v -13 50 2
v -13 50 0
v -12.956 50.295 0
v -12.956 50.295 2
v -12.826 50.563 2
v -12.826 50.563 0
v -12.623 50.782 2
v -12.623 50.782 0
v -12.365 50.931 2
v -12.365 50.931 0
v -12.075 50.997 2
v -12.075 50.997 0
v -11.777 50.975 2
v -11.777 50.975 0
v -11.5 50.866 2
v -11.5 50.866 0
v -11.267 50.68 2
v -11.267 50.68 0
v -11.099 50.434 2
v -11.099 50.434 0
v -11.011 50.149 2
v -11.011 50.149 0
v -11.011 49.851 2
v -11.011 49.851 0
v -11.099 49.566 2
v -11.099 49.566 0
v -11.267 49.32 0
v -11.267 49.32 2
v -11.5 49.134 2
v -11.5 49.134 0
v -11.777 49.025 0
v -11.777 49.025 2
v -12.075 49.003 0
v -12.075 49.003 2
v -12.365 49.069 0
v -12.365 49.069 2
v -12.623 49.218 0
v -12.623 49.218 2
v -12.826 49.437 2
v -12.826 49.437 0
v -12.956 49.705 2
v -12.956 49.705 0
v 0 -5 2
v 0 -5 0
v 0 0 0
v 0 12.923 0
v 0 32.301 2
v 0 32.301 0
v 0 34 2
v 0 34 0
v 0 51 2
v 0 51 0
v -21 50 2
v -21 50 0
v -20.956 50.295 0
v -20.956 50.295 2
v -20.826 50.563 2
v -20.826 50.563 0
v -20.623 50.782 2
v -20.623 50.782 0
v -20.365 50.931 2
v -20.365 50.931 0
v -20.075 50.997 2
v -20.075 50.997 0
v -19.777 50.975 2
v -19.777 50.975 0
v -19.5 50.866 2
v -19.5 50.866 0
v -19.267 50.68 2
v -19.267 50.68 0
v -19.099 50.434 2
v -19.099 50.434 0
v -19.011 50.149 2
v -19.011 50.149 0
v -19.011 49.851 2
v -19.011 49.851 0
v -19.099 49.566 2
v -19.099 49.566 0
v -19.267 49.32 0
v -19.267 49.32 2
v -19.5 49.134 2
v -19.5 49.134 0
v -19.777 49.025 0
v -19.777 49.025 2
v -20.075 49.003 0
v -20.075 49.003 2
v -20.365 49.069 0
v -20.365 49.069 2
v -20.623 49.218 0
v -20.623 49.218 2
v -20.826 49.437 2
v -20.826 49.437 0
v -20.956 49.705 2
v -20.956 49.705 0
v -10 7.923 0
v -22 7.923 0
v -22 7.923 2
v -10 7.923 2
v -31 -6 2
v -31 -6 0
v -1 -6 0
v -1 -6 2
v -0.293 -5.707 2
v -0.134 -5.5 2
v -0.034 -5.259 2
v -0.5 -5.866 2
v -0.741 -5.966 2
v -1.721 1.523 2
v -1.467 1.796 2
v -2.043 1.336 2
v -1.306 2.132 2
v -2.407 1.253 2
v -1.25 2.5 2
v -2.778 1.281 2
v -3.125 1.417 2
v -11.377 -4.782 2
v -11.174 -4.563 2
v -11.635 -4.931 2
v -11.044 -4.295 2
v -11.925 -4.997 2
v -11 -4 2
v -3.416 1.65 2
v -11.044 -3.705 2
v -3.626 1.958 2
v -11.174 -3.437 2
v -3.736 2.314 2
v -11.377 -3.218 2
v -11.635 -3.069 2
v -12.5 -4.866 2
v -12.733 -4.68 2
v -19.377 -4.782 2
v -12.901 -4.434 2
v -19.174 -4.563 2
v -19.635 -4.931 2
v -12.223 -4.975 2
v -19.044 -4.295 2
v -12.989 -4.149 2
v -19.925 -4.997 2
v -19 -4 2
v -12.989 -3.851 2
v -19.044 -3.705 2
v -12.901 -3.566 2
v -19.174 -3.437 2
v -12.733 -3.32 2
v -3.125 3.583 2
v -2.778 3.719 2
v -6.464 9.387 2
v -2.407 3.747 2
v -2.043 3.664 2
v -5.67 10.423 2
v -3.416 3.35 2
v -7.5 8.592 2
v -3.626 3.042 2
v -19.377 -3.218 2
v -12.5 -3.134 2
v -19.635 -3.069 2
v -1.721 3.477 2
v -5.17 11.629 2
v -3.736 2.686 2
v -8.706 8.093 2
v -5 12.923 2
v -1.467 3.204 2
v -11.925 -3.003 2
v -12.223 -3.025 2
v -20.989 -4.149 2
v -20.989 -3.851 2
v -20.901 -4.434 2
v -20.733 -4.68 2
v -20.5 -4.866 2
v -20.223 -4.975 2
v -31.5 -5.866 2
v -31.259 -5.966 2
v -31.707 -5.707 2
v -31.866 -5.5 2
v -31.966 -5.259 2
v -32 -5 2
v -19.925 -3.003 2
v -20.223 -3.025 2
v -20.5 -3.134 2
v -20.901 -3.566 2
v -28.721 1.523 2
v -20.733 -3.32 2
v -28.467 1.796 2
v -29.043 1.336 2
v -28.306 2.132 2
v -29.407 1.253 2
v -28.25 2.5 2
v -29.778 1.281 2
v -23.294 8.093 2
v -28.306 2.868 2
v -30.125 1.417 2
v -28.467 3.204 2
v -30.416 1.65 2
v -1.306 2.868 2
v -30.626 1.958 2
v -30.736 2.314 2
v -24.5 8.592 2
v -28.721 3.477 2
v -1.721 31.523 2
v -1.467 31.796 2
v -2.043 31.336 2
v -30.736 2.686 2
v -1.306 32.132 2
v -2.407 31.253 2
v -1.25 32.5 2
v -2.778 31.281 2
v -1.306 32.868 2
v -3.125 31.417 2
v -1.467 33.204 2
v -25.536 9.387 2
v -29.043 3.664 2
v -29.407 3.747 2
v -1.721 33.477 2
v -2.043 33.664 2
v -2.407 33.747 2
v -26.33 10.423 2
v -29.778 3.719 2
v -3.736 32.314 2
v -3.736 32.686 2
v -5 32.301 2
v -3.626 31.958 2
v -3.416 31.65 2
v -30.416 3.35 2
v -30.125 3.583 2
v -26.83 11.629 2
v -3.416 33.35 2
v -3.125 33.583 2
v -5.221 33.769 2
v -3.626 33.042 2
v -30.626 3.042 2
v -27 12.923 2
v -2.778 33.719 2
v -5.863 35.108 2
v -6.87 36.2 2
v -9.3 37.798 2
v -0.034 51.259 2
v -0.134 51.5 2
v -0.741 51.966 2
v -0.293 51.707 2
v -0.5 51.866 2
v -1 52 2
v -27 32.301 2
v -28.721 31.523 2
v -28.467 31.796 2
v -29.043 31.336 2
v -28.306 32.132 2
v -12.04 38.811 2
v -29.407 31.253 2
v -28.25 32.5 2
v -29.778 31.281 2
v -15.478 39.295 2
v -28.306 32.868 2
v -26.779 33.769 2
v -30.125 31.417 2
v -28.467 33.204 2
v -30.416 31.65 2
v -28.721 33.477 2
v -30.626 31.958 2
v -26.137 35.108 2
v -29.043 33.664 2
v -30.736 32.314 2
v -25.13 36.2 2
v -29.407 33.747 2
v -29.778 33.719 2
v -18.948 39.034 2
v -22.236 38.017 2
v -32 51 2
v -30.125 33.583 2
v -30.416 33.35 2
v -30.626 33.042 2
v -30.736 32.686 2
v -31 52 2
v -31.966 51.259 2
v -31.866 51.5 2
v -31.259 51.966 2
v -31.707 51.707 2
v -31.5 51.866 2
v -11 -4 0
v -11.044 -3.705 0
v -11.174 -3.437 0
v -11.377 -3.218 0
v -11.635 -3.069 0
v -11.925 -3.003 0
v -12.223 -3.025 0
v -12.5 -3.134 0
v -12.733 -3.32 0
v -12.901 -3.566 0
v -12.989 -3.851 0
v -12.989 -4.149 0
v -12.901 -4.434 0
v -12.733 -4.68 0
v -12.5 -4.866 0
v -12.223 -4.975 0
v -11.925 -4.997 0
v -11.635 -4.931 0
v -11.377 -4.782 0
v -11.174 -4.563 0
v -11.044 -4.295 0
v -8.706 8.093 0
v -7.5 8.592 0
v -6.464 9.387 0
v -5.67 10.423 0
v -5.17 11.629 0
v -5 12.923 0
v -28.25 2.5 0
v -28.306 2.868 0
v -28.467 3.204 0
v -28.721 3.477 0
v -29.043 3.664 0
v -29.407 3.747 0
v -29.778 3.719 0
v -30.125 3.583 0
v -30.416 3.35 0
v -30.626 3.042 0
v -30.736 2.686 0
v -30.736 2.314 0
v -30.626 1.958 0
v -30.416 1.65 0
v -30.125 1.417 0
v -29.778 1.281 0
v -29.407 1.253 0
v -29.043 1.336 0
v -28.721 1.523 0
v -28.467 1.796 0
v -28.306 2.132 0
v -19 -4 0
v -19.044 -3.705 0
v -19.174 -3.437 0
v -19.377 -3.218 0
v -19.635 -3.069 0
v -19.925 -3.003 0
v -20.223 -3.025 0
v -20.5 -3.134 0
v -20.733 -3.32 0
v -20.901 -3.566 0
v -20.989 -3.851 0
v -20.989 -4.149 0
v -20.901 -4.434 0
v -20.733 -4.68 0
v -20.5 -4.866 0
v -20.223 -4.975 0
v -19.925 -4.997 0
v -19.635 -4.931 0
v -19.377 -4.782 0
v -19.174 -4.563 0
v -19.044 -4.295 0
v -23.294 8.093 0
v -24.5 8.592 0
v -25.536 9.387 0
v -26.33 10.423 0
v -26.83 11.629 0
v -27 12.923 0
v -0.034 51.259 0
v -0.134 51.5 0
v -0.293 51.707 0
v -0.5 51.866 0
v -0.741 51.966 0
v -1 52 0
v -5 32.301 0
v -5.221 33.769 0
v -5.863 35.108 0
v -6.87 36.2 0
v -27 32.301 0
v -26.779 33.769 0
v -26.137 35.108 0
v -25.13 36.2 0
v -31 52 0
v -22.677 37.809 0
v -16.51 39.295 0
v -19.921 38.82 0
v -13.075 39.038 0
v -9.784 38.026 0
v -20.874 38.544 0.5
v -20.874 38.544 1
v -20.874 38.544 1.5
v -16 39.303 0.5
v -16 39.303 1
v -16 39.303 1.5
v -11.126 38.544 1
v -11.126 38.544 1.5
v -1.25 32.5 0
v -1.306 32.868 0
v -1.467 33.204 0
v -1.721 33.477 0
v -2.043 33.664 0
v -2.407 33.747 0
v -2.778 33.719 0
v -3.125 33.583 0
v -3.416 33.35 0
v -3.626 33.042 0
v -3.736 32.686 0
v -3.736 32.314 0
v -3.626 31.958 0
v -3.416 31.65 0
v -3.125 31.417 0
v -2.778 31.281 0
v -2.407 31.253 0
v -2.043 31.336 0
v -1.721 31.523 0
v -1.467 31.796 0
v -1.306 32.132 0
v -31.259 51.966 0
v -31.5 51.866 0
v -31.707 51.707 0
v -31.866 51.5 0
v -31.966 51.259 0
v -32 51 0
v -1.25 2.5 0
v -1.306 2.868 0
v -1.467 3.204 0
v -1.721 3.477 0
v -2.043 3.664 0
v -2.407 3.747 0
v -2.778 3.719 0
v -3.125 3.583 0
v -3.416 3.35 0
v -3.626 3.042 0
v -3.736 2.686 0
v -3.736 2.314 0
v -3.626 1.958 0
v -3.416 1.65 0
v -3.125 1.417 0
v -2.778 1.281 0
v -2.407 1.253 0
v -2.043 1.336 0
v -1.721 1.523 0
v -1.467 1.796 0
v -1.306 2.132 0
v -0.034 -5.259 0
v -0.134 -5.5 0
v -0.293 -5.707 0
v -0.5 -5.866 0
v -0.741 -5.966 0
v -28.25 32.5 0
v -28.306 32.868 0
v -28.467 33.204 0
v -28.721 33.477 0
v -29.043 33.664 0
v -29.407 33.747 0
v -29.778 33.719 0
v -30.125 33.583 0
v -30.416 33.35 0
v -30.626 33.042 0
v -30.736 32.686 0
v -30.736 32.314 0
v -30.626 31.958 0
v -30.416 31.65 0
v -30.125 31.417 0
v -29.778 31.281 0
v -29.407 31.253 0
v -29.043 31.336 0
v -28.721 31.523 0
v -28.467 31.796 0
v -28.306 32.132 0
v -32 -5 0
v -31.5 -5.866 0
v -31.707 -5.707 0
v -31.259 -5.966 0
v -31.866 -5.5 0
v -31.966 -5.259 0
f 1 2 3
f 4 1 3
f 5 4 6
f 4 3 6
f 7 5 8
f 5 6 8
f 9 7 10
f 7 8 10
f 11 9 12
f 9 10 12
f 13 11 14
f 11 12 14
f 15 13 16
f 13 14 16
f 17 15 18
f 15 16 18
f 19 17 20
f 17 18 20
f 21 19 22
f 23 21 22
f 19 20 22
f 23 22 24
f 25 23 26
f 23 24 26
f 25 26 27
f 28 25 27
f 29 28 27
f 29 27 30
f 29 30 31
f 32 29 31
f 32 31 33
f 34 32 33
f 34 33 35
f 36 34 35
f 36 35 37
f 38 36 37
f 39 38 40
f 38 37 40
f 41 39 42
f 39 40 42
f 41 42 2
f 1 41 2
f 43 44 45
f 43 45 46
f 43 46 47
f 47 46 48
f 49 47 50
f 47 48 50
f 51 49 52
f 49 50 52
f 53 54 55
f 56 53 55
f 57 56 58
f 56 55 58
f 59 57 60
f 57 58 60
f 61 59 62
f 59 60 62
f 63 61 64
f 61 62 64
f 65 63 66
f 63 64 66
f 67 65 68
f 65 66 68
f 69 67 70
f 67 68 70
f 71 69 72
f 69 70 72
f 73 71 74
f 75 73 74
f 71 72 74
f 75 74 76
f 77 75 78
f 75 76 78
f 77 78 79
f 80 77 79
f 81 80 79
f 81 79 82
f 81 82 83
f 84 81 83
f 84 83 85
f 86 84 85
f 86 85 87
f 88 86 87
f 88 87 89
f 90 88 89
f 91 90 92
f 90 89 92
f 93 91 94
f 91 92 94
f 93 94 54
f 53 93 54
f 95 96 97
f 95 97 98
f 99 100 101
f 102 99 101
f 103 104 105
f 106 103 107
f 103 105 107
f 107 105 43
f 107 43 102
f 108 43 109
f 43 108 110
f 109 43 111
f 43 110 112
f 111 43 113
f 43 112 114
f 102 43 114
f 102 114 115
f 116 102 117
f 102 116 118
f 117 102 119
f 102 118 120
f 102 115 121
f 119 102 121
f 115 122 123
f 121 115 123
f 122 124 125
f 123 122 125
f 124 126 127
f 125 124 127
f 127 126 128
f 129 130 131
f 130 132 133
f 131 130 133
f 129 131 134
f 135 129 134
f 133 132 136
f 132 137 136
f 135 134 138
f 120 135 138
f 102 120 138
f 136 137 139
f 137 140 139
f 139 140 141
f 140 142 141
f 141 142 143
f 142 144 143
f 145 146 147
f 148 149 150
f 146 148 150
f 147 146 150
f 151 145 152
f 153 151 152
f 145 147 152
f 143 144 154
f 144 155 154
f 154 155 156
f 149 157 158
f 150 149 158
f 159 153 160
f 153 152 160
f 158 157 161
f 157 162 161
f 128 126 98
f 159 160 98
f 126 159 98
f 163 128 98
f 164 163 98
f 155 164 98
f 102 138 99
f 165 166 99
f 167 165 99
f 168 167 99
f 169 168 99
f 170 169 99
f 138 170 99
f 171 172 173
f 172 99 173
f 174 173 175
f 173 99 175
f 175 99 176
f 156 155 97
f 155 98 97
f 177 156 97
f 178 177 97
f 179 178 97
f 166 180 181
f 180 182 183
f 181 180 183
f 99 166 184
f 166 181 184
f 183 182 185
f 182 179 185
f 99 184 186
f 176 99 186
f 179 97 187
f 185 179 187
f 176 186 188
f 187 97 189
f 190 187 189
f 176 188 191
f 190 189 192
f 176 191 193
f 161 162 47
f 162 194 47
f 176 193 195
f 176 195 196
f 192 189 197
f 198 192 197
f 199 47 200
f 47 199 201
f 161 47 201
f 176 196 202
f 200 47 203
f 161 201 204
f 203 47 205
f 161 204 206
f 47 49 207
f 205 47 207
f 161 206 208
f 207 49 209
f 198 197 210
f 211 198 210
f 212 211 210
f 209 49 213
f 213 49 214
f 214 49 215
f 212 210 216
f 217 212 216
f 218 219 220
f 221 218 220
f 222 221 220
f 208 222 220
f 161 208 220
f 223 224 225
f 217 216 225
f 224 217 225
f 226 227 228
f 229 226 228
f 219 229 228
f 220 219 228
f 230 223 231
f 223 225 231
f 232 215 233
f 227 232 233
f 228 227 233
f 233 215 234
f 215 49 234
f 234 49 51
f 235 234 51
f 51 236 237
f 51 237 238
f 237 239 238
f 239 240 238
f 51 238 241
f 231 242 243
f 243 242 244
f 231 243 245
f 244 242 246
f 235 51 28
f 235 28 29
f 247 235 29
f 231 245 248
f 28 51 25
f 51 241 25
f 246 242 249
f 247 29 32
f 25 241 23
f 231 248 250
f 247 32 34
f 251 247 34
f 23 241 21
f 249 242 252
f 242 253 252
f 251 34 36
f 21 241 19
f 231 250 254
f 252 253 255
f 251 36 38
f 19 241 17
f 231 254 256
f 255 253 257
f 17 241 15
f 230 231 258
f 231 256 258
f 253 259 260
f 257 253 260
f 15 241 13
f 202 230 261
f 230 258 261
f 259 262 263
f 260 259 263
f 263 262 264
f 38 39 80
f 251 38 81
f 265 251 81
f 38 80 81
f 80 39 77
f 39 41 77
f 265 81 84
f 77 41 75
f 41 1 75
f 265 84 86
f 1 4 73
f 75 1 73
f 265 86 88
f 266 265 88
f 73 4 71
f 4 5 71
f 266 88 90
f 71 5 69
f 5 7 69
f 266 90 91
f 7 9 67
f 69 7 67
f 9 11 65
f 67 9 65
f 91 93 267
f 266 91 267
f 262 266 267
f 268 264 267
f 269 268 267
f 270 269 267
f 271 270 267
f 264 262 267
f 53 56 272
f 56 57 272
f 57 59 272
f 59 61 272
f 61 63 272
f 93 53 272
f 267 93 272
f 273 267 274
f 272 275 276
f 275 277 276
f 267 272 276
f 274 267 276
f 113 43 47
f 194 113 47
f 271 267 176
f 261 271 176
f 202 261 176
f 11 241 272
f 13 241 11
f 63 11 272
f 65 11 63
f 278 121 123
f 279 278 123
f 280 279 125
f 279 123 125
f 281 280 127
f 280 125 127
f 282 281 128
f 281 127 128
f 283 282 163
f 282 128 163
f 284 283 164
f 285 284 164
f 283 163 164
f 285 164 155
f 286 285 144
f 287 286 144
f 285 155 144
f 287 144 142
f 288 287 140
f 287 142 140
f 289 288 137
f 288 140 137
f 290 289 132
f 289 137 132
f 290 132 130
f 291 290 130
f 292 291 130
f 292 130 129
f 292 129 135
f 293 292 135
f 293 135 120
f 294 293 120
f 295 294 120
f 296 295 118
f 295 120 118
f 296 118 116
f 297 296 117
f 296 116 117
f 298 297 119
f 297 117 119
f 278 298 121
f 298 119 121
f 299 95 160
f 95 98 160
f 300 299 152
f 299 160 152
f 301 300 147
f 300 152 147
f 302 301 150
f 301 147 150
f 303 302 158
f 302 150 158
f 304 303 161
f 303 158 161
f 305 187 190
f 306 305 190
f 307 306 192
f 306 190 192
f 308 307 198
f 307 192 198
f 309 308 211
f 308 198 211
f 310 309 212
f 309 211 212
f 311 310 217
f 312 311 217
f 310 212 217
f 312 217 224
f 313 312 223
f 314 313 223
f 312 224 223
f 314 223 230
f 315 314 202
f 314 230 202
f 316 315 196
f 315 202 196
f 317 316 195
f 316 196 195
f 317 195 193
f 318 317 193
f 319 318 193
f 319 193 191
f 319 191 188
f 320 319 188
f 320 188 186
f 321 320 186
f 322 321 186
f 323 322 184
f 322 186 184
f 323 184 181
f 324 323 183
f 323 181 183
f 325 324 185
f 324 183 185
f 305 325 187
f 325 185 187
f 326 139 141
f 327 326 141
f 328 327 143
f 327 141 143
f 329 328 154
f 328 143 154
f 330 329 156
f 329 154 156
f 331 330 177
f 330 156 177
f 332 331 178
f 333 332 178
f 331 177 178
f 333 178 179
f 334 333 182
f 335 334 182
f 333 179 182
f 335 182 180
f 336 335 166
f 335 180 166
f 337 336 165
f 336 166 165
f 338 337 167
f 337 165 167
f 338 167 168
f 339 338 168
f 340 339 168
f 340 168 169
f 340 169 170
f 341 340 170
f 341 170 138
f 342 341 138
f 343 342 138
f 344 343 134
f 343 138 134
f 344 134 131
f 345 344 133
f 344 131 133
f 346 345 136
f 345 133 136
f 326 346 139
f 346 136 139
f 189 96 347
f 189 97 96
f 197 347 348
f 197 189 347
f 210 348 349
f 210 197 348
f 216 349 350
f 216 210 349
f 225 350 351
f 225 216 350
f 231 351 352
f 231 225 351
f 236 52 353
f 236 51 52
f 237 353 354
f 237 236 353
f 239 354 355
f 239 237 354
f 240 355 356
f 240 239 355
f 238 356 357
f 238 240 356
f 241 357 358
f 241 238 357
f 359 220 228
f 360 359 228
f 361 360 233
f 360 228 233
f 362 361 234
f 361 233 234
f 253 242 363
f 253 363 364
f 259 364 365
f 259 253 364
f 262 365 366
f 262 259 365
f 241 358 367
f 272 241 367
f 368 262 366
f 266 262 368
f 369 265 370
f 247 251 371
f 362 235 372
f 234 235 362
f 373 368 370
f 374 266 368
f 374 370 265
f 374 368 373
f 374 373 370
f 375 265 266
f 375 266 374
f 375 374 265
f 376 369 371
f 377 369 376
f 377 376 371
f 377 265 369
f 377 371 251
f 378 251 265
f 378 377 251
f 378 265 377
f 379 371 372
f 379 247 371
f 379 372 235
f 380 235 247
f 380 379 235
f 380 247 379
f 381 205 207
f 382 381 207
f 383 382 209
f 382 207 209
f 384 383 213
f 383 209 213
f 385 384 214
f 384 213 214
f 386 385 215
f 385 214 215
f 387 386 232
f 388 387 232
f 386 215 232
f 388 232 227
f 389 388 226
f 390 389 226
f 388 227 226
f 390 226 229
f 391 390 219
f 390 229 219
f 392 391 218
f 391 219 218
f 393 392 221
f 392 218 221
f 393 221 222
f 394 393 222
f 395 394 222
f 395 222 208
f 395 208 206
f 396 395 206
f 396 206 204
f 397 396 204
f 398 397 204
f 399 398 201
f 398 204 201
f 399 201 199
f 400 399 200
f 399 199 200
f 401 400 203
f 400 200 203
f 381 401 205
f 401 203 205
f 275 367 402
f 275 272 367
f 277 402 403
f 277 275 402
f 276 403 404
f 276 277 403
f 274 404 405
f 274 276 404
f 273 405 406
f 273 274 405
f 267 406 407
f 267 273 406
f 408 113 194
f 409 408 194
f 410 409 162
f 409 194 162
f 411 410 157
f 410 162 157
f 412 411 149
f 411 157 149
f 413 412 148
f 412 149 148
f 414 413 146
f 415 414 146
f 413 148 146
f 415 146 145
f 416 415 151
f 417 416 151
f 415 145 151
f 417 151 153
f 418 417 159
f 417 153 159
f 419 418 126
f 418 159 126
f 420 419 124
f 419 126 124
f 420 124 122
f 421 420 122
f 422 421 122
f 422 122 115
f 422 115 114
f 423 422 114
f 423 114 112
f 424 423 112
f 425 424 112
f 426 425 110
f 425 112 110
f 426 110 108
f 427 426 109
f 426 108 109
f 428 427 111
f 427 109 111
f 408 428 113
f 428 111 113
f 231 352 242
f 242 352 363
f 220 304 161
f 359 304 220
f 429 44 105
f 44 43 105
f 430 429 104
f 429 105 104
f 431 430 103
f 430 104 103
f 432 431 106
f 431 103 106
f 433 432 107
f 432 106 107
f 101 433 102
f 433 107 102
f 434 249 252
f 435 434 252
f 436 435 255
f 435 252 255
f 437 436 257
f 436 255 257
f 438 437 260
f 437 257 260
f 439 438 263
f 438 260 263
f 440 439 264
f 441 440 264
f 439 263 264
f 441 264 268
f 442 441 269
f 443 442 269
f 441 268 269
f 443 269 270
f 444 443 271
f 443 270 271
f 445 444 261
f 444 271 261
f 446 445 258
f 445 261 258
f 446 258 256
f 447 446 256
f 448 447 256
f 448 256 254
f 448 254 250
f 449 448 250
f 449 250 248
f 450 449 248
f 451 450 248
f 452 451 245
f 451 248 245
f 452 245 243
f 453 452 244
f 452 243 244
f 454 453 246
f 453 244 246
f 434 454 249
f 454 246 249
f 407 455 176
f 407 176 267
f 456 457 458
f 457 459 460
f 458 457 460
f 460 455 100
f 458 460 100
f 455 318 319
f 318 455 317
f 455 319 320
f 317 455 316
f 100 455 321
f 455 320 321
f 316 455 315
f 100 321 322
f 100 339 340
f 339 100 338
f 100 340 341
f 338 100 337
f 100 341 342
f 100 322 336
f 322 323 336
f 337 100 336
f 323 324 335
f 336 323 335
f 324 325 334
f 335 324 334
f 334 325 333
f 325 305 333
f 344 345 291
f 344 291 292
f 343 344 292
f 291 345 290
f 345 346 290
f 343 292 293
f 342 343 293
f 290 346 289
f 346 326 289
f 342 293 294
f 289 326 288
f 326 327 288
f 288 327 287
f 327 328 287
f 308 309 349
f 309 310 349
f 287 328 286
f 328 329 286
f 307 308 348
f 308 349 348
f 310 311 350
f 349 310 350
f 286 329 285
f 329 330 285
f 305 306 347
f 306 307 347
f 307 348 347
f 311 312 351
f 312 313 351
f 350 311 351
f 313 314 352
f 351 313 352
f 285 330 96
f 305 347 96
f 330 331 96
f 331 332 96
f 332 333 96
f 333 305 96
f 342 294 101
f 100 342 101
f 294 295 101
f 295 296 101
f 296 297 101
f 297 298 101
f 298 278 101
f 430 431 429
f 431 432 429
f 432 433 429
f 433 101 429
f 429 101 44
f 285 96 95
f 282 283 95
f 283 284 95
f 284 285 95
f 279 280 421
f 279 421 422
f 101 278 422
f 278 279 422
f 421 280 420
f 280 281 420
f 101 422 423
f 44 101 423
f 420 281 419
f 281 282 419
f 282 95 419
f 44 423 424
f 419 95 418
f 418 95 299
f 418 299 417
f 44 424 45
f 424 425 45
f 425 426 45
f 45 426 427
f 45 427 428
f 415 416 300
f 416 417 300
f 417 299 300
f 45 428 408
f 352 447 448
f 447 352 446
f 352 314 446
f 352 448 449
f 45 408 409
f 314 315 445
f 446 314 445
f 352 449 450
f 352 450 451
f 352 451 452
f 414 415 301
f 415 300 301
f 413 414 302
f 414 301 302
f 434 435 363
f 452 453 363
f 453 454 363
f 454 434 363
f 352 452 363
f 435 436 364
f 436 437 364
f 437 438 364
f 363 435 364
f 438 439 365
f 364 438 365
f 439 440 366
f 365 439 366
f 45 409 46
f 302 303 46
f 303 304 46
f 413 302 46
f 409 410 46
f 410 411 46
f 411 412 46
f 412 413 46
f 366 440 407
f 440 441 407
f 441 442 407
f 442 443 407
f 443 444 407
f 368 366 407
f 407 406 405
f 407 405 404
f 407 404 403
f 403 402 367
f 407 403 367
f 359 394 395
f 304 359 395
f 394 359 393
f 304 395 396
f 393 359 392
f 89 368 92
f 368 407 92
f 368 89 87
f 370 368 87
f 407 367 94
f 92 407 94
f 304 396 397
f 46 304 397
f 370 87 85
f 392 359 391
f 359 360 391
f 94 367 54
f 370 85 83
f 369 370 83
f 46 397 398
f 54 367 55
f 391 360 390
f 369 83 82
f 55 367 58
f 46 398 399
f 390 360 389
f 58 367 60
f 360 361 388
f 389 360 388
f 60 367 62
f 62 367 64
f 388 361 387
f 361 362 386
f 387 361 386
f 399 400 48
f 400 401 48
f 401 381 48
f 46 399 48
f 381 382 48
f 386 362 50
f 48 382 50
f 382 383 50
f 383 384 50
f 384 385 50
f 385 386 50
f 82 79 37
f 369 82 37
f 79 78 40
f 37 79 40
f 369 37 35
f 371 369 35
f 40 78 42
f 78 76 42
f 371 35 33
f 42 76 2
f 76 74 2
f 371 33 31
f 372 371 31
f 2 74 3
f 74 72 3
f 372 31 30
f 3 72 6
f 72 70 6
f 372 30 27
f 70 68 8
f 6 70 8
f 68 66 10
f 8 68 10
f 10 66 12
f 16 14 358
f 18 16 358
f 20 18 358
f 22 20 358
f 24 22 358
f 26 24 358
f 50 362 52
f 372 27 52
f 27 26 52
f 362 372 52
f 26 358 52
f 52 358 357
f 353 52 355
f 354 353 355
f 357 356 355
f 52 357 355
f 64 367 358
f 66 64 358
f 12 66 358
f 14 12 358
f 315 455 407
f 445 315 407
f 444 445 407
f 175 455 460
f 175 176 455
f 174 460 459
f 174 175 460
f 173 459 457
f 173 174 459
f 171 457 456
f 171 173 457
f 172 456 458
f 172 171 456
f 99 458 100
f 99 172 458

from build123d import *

# Parameters (mm, degrees)
EXTRUDE_1_OUTLINE_W  = 22
EXTRUDE_1_OUTLINE_H  = 29.37803775
EXTRUDE_1_DEPTH      = 2
FILLET_2_R           = 5
FILLET_3_R           = 5
FILLET_4_R           = 5
FILLET_5_DEPTH       = 2
FILLET_6_R           = 5
FILLET_7_R           = 5
SKETCH_4_R           = 1.25
CUT_EXTRUDE_1_DEPTH  = 2
SKETCH_5_R           = 1
CUT_EXTRUDE_3_DEPTH  = 10
CUT_EXTRUDE_4_DEPTH  = 10
EXTRUDE_3_DEPTH      = 2
SKETCH_8_R           = 1
CUT_EXTRUDE_5_DEPTH  = 2
SKETCH_9_W           = 4.328082866
SKETCH_9_H           = 16.646472559
EXTRUDE_5_DEPTH      = 2
SKETCH_11_R          = 1
CUT_EXTRUDE_6_DEPTH  = 2
SKETCH_14_W          = 35.331907889
SKETCH_14_H          = 71.069334822
CUT_EXTRUDE_7_DEPTH  = 10
SKETCH_15_W          = 33.93252641
SKETCH_15_H          = 4.378984323
EXTRUDE_6_DEPTH      = 2
SKETCH_16_W          = 33.760249026
SKETCH_16_H          = 7.770173485
CUT_EXTRUDE_9_DEPTH  = 2
CUT_EXTRUDE_10_DEPTH = 2
FILLET_8_R           = 5
EXTRUDE_START        = -2
EXTRUDE_7_DEPTH      = 2
EXTRUDE_8_DEPTH      = 2
SKETCH_20_W          = 32.150509504
SKETCH_20_H          = 6.514442596
CUT_EXTRUDE_11_DEPTH = 2
FILLET_9_R           = 5
SKETCH_23_R          = 1.25
CUT_EXTRUDE_12_DEPTH = 2
SKETCH_24_R          = 1.25
CUT_EXTRUDE_13_DEPTH = 10
CUT_EXTRUDE_14_DEPTH = 10
CUT_EXTRUDE_START    = -10
CUT_EXTRUDE_15_DEPTH = 10
SKETCH_28_R          = 1
EXTRUDE_10_DEPTH     = 2
SKETCH_29_W          = 32
SKETCH_29_H          = 4
SKETCH_29_R          = 1
EXTRUDE_11_DEPTH     = 2
SKETCH_31_R          = 1
CUT_EXTRUDE_17_DEPTH = 2
SKETCH_32_R          = 1
EXTRUDE_15_DEPTH     = 2
SKETCH_33_R          = 1
CUT_EXTRUDE_18_DEPTH = 2
SKETCH_35_R          = 1
EXTRUDE_16_DEPTH     = 2
SKETCH_36_W          = 32
SKETCH_36_H          = 2
EXTRUDE_17_DEPTH     = 2
SKETCH_37_R          = 1
EXTRUDE_19_DEPTH     = 2
SKETCH_38_R          = 1
CUT_EXTRUDE_21_DEPTH = 2
SKETCH_39_R          = 1
SKETCH_39_W          = 32
SKETCH_39_H          = 2
EXTRUDE_21_DEPTH     = 2
SKETCH_41_R          = 1
CUT_EXTRUDE_22_DEPTH = 2
FILLET_10_R          = 1


with BuildPart() as part:
    # 填料-伸長1: read off the stored shape, not the designer's step
    # 填料-伸長1 outline → 填料-伸長1 (new body)
    with BuildSketch(Plane.XY):
        with BuildLine():
            add(Edge.make_bspline(
                [(-32, 0), (-17.903811151, 0), (-12.226895644, -2.15390634), (-4.846905484, -2.579675003), (1.255778686, -1.586214789), (6.648848418, -2.437752115), (10.054997723, -2.228718788), (26.130584508, 3.269137633), (32.041733308, 41.295248118), (28.788818897, 71.787918144), (16.157681893, 46.951412799), (8.635768846, 50.925253654), (9.345383285, 39.571422639), (-5.414597035, 46), (-17.761888263, 46), (-32, 46)],
                knots=[0, 0, 0, 0, 0, 0, 0, 0, 0, 1, 1, 1, 1, 1, 1, 1, 1.916713019, 1.916713019, 1.916713019, 1.916713019, 1.916713019, 1.916713019, 1.916713019, 1.916713019, 1.916713019], degree=8))
            Line((-32, 46), (-37.468647548, 46))
            Line((-37.468647548, 46), (-37.468647548, 37.300656436))
            Line((-37.468647548, 37.300656436), (-32, 37.300656436))
            Line((-32, 37.300656436), (-32, 7.922618686))
            Line((-32, 7.922618686), (-37.468647548, 7.922618686))
            Line((-37.468647548, 7.922618686), (-37.468647548, 0))
            Line((-37.468647548, 0), (-32, 0))
        make_face()
        with Locations((-16, 22.611637561)):
            Rectangle(EXTRUDE_1_OUTLINE_W, EXTRUDE_1_OUTLINE_H, mode=Mode.SUBTRACT)
        Polygon((0, 37.300656436), (18.937237107, 37.300656436), (18.937237107, 17.573375048), (6.731868766, 7.922618686), (0, 7.922618686), align=None, mode=Mode.SUBTRACT)
    extrude(amount=EXTRUDE_1_DEPTH)

    # 圓角2
    fillet_2_edges = [part.edges().sort_by_distance(p)[0] for p in [
        (18.937237107, 37.300656436, 1),
    ]]
    fillet(fillet_2_edges, radius=FILLET_2_R)

    # 圓角3
    fillet_3_edges = [part.edges().sort_by_distance(p)[0] for p in [
        (18.937237107, 17.573375048, 1),
    ]]
    fillet(fillet_3_edges, radius=FILLET_3_R)

    # 圓角4
    fillet_4_edges = [part.edges().sort_by_distance(p)[0] for p in [
        (6.731868766, 7.922618686, 1),
    ]]
    fillet(fillet_4_edges, radius=FILLET_4_R)

    # 圓角5: read off the stored shape, not the designer's step
    # 圓角5 outline → 圓角5 (add)
    with BuildSketch(Plane.XY):
        with BuildLine():
            Line((0, 7.922618686), (4.993945193, 7.922618686))
            ThreePointArc((4.993945193, 7.922618686), (1.462326044, 9.38922246), (0, 12.92261502))
            Line((0, 12.92261502), (0, 7.922618686))
        make_face()
    extrude(amount=FILLET_5_DEPTH)

    # 圓角6
    fillet_6_edges = [part.edges().sort_by_distance(p)[0] for p in [
        (0, 37.300656436, 1),
        (-5, 7.922618686, 1),
        (-5, 37.300656436, 1),
        (-27, 37.300656436, 1),
        (-27, 7.922618686, 1),
    ]]
    fillet(fillet_6_edges, radius=FILLET_6_R)

    # 圓角7
    fillet_7_edges = [part.edges().sort_by_distance(p)[0] for p in [
        (-32, 7.922618686, 1),
        (-32, 37.300656436, 1),
    ]]
    fillet(fillet_7_edges, radius=FILLET_7_R)

    # 草圖4 → 除料-伸長1 (cut)
    with BuildSketch(Plane.XY.offset(2)):
        with Locations((-2.5, 32.5)):
            Circle(SKETCH_4_R)
        with Locations((-2.5, 2.5)):
            Circle(SKETCH_4_R)
        with Locations((-29.5, 2.5)):
            Circle(SKETCH_4_R)
        with Locations((-29.5, 32.5)):
            Circle(SKETCH_4_R)
    extrude(amount=-CUT_EXTRUDE_1_DEPTH, mode=Mode.SUBTRACT)

    # 草圖5 → 除料-伸長3 (cut)
    with BuildSketch(Plane.XY.offset(2)):
        with Locations((15.768736936, 44.547982454)):
            Circle(SKETCH_5_R)
        with Locations((21.425591185, 38.891128205)):
            Circle(SKETCH_5_R)
        with Locations((18.503337652, 13.912131705)):
            Circle(SKETCH_5_R)
        with Locations((12.846483402, 8.255277455)):
            Circle(SKETCH_5_R)
    extrude(amount=-CUT_EXTRUDE_3_DEPTH, mode=Mode.SUBTRACT)

    # 草圖6 → 除料-伸長4 (cut)
    with BuildSketch(Plane.XY.offset(2)):
        with BuildLine():
            Line((-25.535533906, 35.836190342), (-6.464466094, 35.836190342))
            add(Edge.make_bspline(
                [(-25.535533906, 35.836190342), (-21.735533906, 39.414802563), (-16, 40.309589175), (-10.264466094, 39.414802563), (-6.464466094, 35.836190342)],
                knots=[0, 0, 0, 0, 0, 1, 1, 1, 1, 1], degree=4))
        make_face()
    extrude(amount=-CUT_EXTRUDE_4_DEPTH, mode=Mode.SUBTRACT)

    # 草圖7 → 填料-伸長3 (add)
    with BuildSketch(Plane.XY.offset(2)):
        with BuildLine():
            Line((-32.468647548, 37.300656436), (-38.802161961, 37.300656436))
            ThreePointArc((-38.802161961, 37.300656436), (-42.337695867, 35.836190342), (-43.802161961, 32.300656436))
            Line((-43.802161961, 32.300656436), (-43.802161961, 12.922618686))
            ThreePointArc((-43.802161961, 12.922618686), (-42.337695867, 9.38708478), (-38.802161961, 7.922618686))
            Line((-38.802161961, 7.922618686), (-32.468647548, 7.922618686))
            Line((-32.468647548, 7.922618686), (-32.468647548, 0))
            Line((-32.468647548, 0), (-38.802161961, 0))
            Line((-38.802161961, 0), (-43.802161961, 0))
            Line((-43.802161961, 0), (-49.941860706, 0))
            Line((-49.941860706, 0), (-49.941860706, 46))
            Line((-49.941860706, 46), (-45.941860706, 46))
            Line((-45.941860706, 46), (-38.802161961, 46))
            Line((-38.802161961, 46), (-32.468647548, 46))
            Line((-32.468647548, 46), (-32.468647548, 37.300656436))
        make_face()
    extrude(amount=-EXTRUDE_3_DEPTH)

    # 草圖8 → 除料-伸長5 (cut)
    with BuildSketch(Plane.XY.offset(2)):
        with Locations((-46.872011333, 27)):
            Circle(SKETCH_8_R)
        with Locations((-46.872011333, 19)):
            Circle(SKETCH_8_R)
    extrude(amount=-CUT_EXTRUDE_5_DEPTH, mode=Mode.SUBTRACT)

    # 草圖9 → 填料-伸長5 (add)
    with BuildSketch(Plane.XY.offset(2)):
        with Locations((-46.861716305, 22.916170807)):
            Rectangle(SKETCH_9_W, SKETCH_9_H)
    extrude(amount=-EXTRUDE_5_DEPTH)

    # 草圖11 → 除料-伸長6 (cut)
    with BuildSketch(Plane.XY.offset(2)):
        with Locations((-47.941860706, 27)):
            Circle(SKETCH_11_R)
        with Locations((-47.941860706, 19)):
            Circle(SKETCH_11_R)
    extrude(amount=-CUT_EXTRUDE_6_DEPTH, mode=Mode.SUBTRACT)

    # 草圖14 → 除料-伸長7 (cut)
    with BuildSketch(Plane(origin=(0, 0, 0), x_dir=(-1, 0, 0), z_dir=(0, 0, -1))):
        with Locations((-17.665953945, 27.656712391)):
            Rectangle(SKETCH_14_W, SKETCH_14_H)
    extrude(amount=-CUT_EXTRUDE_7_DEPTH, mode=Mode.SUBTRACT)

    # 草圖15 → 填料-伸長6 (add)
    with BuildSketch(Plane(origin=(0, 0, 0), x_dir=(-1, 0, 0), z_dir=(0, 0, -1))):
        with Locations((16.966263205, 43.810507839)):
            Rectangle(SKETCH_15_W, SKETCH_15_H)
    extrude(amount=-EXTRUDE_6_DEPTH)

    # 草圖16 → 除料-伸長9 (cut)
    with BuildSketch(Plane(origin=(0, 0, 0), x_dir=(-1, 0, 0), z_dir=(0, 0, -1))):
        with Locations((16.880124513, -3.885086743)):
            Rectangle(SKETCH_16_W, SKETCH_16_H)
    extrude(amount=-CUT_EXTRUDE_9_DEPTH, mode=Mode.SUBTRACT)

    # 草圖17 → 除料-伸長10 (cut)
    with BuildSketch(Plane.XY.offset(2)):
        with BuildLine():
            Line((-5.416994756, 46), (0, 46))
            Line((0, 46), (0, 34))
            ThreePointArc((0, 34), (-1.416994756, 40.583005244), (-5.416994756, 46))
        make_face()
    extrude(amount=-CUT_EXTRUDE_10_DEPTH, mode=Mode.SUBTRACT)

    # 圓角8
    fillet_8_edges = [part.edges().sort_by_distance(p)[0] for p in [
        (-49.941860706, 46, 1),
        (-49.941860706, 0, 1),
    ]]
    fillet(fillet_8_edges, radius=FILLET_8_R)

    # 填料-伸長7: read off the stored shape, not the designer's step
    # 填料-伸長7 outline → 填料-伸長7 (add)
    with BuildSketch(Plane.XY.offset(2).offset(EXTRUDE_START)):
        with BuildLine():
            ThreePointArc((-49.941860706, -4.227169739), (-48.36025598, -7.876063738), (-44.616051215, -9.216523212))
            add(Edge.make_bspline(
                [(-44.616051215, -9.216523212), (-33.742886609, -9.216523212), (-25.346473604, -9.216523212), (-23.751624206, -9.216523212), (-22.145120862, -8.325283843), (-15.674190509, 0)],
                knots=[0, 0, 0, 0, 0, 0, 1, 1, 1, 1, 1, 1], degree=5))
            Line((-15.674190509, 0), (-44.941860706, 0))
            ThreePointArc((-44.941860706, 0), (-48.477394612, 1.464466094), (-49.941860706, 5))
            Line((-49.941860706, 5), (-49.941860706, -4.227169739))
        make_face()
    extrude(amount=EXTRUDE_7_DEPTH)

    # 填料-伸長8: read off the stored shape, not the designer's step
    # 填料-伸長8 outline → 填料-伸長8 (add)
    with BuildSketch(Plane.XY.offset(2).offset(EXTRUDE_START)):
        with BuildLine():
            Line((-44.941860706, 46), (-5.416994756, 46))
            add(Edge.make_bspline(
                [(-5.416994756, 46), (-5.995214333, 46.509941735), (-8.96505883, 47.689704563), (-13.043339364, 49.589177689), (-19.132826738, 50.371313682), (-34.255378163, 50.371313682), (-40.342930342, 50.371313682)],
                knots=[0, 0, 0, 0, 0, 0, 0, 1, 1, 1, 1, 1, 1, 1], degree=6))
            Line((-40.342930342, 50.371313682), (-44.941860706, 50.371313682))
            ThreePointArc((-44.941860706, 50.371313682), (-48.477394612, 48.906847588), (-49.941860706, 45.371313682))
            Line((-49.941860706, 45.371313682), (-49.941860706, 41))
            ThreePointArc((-49.941860706, 41), (-48.477394612, 44.535533906), (-44.941860706, 46))
        make_face()
    extrude(amount=EXTRUDE_8_DEPTH)

    # 草圖20 → 除料-伸長11 (cut)
    with BuildSketch(Plane.XY.offset(2)):
        with Locations((-33.866605954, -7.484391037)):
            Rectangle(SKETCH_20_W, SKETCH_20_H)
    extrude(amount=-CUT_EXTRUDE_11_DEPTH, mode=Mode.SUBTRACT)

    # 圓角9
    fillet_9_edges = [part.edges().sort_by_distance(p)[0] for p in [
        (-49.941860706, -4.227169739, 1),
        (-19.111361456, -4.227169739, 1),
        (-15.674190509, 0, 1),
    ]]
    fillet(fillet_9_edges, radius=FILLET_9_R)

    # 草圖23 → 除料-伸長12 (cut)
    with BuildSketch(Plane(origin=(0, 0, 0), x_dir=(-1, 0, 0), z_dir=(0, 0, -1))):
        with Locations((46.883721416, 2.5)):
            Circle(SKETCH_23_R)
    extrude(amount=-CUT_EXTRUDE_12_DEPTH, mode=Mode.SUBTRACT)

    # 草圖24 → 除料-伸長13 (cut)
    with BuildSketch(Plane(origin=(0, 0, 0), x_dir=(-1, 0, 0), z_dir=(0, 0, -1))):
        with Locations((46.883721416, 40.144143942)):
            Circle(SKETCH_24_R)
        with Locations((36.499999996, 40.144143942)):
            Circle(SKETCH_24_R)
    extrude(amount=-CUT_EXTRUDE_13_DEPTH, mode=Mode.SUBTRACT)

    # 草圖25 → 除料-伸長14 (cut)
    with BuildSketch(Plane(origin=(0, 0, 0), x_dir=(-1, 0, 0), z_dir=(0, 0, -1))):
        Polygon((5.416994756, 46), (32, 46), (32, 32.300656436), (32, 0), (0, 0), (0, -4.227169739), (49.941860706, -4.227169739), (49.941860706, 50.371313682), (5.416994756, 50.371313682), align=None)
    extrude(amount=-CUT_EXTRUDE_14_DEPTH, mode=Mode.SUBTRACT)

    # 草圖26 → 除料-伸長15 (cut)
    with BuildSketch(Plane(origin=(0, 0, 0), x_dir=(-1, 0, 0), z_dir=(0, 0, -1)).offset(CUT_EXTRUDE_START)):
        with BuildLine():
            Line((26.583005244, 46), (32, 46))
            Line((32, 46), (32, 34))
            ThreePointArc((32, 34), (30.583005244, 40.583005244), (26.583005244, 46))
        make_face()
    extrude(amount=CUT_EXTRUDE_15_DEPTH, mode=Mode.SUBTRACT)

    # 草圖28 → 填料-伸長10 (add)
    with BuildSketch(Plane(origin=(0, 0, 0), x_dir=(-1, 0, 0), z_dir=(0, 0, -1)).offset(EXTRUDE_START)):
        with BuildLine():
            Line((0, 34), (0, 50))
            Line((0, 50), (32, 50))
            Line((32, 50), (32, 34))
            ThreePointArc((32, 34), (30.583005244, 40.583005244), (26.583005244, 46))
            Line((26.583005244, 46), (5.416994756, 46))
            ThreePointArc((5.416994756, 46), (1.416994756, 40.583005244), (0, 34))
        make_face()
        with Locations((16, 48)):
            Circle(SKETCH_28_R, mode=Mode.SUBTRACT)
    extrude(amount=EXTRUDE_10_DEPTH)

    # 草圖29 → 填料-伸長11 (add)
    with BuildSketch(Plane(origin=(0, 0, 0), x_dir=(-1, 0, 0), z_dir=(0, 0, -1))):
        with Locations((16, -2)):
            Rectangle(SKETCH_29_W, SKETCH_29_H)
        with Locations((16, -2)):
            Circle(SKETCH_29_R, mode=Mode.SUBTRACT)
    extrude(amount=-EXTRUDE_11_DEPTH)

    # 草圖31 → 除料-伸長17 (cut)
    with BuildSketch(Plane(origin=(0, 0, 0), x_dir=(-1, 0, 0), z_dir=(0, 0, -1))):
        with Locations((12, 48)):
            Circle(SKETCH_31_R)
        with Locations((20, 48)):
            Circle(SKETCH_31_R)
    extrude(amount=-CUT_EXTRUDE_17_DEPTH, mode=Mode.SUBTRACT)

    # 草圖32 → 填料-伸長15 (add)
    with BuildSketch(Plane(origin=(0, 0, 0), x_dir=(-1, 0, 0), z_dir=(0, 0, -1)).offset(EXTRUDE_START)):
        with Locations((16, 48)):
            Circle(SKETCH_32_R)
    extrude(amount=EXTRUDE_15_DEPTH)

    # 草圖33 → 除料-伸長18 (cut)
    with BuildSketch(Plane(origin=(0, 0, 0), x_dir=(-1, 0, 0), z_dir=(0, 0, -1))):
        with Locations((12, -2)):
            Circle(SKETCH_33_R)
        with Locations((20, -2)):
            Circle(SKETCH_33_R)
    extrude(amount=-CUT_EXTRUDE_18_DEPTH, mode=Mode.SUBTRACT)

    # 草圖35 → 填料-伸長16 (add)
    with BuildSketch(Plane(origin=(0, 0, 0), x_dir=(-1, 0, 0), z_dir=(0, 0, -1))):
        with Locations((16, -2)):
            Circle(SKETCH_35_R)
    extrude(amount=-EXTRUDE_16_DEPTH)

    # 草圖36 → 填料-伸長17 (add)
    with BuildSketch(Plane(origin=(0, 0, 0), x_dir=(-1, 0, 0), z_dir=(0, 0, -1))):
        with Locations((16, 51)):
            Rectangle(SKETCH_36_W, SKETCH_36_H)
    extrude(amount=-EXTRUDE_17_DEPTH)

    # 草圖37 → 填料-伸長19 (add)
    with BuildSketch(Plane(origin=(0, 0, 0), x_dir=(-1, 0, 0), z_dir=(0, 0, -1))):
        with Locations((12, 48)):
            Circle(SKETCH_37_R)
        with Locations((20, 48)):
            Circle(SKETCH_37_R)
    extrude(amount=-EXTRUDE_19_DEPTH)

    # 草圖38 → 除料-伸長21 (cut)
    with BuildSketch(Plane(origin=(0, 0, 0), x_dir=(-1, 0, 0), z_dir=(0, 0, -1))):
        with Locations((12, 50)):
            Circle(SKETCH_38_R)
        with Locations((20, 50)):
            Circle(SKETCH_38_R)
    extrude(amount=-CUT_EXTRUDE_21_DEPTH, mode=Mode.SUBTRACT)

    # 草圖39 → 填料-伸長21 (add)
    with BuildSketch(Plane.XY.offset(2).offset(EXTRUDE_START)):
        with Locations((-20, -2)):
            Circle(SKETCH_39_R)
        with Locations((-12, -2)):
            Circle(SKETCH_39_R)
        with Locations((-16, -5)):
            Rectangle(SKETCH_39_W, SKETCH_39_H)
    extrude(amount=EXTRUDE_21_DEPTH)

    # 草圖41 → 除料-伸長22 (cut)
    with BuildSketch(Plane.XY.offset(2)):
        with Locations((-20, -4)):
            Circle(SKETCH_41_R)
        with Locations((-12, -4)):
            Circle(SKETCH_41_R)
    extrude(amount=-CUT_EXTRUDE_22_DEPTH, mode=Mode.SUBTRACT)

    # 圓角10
    fillet_10_edges = [part.edges().sort_by_distance(p)[0] for p in [
        (0, 52, 1),
        (-32, 52, 1),
        (-32, -6, 1),
        (0, -6, 1),
    ]]
    fillet(fillet_10_edges, radius=FILLET_10_R)


solid = part.part
